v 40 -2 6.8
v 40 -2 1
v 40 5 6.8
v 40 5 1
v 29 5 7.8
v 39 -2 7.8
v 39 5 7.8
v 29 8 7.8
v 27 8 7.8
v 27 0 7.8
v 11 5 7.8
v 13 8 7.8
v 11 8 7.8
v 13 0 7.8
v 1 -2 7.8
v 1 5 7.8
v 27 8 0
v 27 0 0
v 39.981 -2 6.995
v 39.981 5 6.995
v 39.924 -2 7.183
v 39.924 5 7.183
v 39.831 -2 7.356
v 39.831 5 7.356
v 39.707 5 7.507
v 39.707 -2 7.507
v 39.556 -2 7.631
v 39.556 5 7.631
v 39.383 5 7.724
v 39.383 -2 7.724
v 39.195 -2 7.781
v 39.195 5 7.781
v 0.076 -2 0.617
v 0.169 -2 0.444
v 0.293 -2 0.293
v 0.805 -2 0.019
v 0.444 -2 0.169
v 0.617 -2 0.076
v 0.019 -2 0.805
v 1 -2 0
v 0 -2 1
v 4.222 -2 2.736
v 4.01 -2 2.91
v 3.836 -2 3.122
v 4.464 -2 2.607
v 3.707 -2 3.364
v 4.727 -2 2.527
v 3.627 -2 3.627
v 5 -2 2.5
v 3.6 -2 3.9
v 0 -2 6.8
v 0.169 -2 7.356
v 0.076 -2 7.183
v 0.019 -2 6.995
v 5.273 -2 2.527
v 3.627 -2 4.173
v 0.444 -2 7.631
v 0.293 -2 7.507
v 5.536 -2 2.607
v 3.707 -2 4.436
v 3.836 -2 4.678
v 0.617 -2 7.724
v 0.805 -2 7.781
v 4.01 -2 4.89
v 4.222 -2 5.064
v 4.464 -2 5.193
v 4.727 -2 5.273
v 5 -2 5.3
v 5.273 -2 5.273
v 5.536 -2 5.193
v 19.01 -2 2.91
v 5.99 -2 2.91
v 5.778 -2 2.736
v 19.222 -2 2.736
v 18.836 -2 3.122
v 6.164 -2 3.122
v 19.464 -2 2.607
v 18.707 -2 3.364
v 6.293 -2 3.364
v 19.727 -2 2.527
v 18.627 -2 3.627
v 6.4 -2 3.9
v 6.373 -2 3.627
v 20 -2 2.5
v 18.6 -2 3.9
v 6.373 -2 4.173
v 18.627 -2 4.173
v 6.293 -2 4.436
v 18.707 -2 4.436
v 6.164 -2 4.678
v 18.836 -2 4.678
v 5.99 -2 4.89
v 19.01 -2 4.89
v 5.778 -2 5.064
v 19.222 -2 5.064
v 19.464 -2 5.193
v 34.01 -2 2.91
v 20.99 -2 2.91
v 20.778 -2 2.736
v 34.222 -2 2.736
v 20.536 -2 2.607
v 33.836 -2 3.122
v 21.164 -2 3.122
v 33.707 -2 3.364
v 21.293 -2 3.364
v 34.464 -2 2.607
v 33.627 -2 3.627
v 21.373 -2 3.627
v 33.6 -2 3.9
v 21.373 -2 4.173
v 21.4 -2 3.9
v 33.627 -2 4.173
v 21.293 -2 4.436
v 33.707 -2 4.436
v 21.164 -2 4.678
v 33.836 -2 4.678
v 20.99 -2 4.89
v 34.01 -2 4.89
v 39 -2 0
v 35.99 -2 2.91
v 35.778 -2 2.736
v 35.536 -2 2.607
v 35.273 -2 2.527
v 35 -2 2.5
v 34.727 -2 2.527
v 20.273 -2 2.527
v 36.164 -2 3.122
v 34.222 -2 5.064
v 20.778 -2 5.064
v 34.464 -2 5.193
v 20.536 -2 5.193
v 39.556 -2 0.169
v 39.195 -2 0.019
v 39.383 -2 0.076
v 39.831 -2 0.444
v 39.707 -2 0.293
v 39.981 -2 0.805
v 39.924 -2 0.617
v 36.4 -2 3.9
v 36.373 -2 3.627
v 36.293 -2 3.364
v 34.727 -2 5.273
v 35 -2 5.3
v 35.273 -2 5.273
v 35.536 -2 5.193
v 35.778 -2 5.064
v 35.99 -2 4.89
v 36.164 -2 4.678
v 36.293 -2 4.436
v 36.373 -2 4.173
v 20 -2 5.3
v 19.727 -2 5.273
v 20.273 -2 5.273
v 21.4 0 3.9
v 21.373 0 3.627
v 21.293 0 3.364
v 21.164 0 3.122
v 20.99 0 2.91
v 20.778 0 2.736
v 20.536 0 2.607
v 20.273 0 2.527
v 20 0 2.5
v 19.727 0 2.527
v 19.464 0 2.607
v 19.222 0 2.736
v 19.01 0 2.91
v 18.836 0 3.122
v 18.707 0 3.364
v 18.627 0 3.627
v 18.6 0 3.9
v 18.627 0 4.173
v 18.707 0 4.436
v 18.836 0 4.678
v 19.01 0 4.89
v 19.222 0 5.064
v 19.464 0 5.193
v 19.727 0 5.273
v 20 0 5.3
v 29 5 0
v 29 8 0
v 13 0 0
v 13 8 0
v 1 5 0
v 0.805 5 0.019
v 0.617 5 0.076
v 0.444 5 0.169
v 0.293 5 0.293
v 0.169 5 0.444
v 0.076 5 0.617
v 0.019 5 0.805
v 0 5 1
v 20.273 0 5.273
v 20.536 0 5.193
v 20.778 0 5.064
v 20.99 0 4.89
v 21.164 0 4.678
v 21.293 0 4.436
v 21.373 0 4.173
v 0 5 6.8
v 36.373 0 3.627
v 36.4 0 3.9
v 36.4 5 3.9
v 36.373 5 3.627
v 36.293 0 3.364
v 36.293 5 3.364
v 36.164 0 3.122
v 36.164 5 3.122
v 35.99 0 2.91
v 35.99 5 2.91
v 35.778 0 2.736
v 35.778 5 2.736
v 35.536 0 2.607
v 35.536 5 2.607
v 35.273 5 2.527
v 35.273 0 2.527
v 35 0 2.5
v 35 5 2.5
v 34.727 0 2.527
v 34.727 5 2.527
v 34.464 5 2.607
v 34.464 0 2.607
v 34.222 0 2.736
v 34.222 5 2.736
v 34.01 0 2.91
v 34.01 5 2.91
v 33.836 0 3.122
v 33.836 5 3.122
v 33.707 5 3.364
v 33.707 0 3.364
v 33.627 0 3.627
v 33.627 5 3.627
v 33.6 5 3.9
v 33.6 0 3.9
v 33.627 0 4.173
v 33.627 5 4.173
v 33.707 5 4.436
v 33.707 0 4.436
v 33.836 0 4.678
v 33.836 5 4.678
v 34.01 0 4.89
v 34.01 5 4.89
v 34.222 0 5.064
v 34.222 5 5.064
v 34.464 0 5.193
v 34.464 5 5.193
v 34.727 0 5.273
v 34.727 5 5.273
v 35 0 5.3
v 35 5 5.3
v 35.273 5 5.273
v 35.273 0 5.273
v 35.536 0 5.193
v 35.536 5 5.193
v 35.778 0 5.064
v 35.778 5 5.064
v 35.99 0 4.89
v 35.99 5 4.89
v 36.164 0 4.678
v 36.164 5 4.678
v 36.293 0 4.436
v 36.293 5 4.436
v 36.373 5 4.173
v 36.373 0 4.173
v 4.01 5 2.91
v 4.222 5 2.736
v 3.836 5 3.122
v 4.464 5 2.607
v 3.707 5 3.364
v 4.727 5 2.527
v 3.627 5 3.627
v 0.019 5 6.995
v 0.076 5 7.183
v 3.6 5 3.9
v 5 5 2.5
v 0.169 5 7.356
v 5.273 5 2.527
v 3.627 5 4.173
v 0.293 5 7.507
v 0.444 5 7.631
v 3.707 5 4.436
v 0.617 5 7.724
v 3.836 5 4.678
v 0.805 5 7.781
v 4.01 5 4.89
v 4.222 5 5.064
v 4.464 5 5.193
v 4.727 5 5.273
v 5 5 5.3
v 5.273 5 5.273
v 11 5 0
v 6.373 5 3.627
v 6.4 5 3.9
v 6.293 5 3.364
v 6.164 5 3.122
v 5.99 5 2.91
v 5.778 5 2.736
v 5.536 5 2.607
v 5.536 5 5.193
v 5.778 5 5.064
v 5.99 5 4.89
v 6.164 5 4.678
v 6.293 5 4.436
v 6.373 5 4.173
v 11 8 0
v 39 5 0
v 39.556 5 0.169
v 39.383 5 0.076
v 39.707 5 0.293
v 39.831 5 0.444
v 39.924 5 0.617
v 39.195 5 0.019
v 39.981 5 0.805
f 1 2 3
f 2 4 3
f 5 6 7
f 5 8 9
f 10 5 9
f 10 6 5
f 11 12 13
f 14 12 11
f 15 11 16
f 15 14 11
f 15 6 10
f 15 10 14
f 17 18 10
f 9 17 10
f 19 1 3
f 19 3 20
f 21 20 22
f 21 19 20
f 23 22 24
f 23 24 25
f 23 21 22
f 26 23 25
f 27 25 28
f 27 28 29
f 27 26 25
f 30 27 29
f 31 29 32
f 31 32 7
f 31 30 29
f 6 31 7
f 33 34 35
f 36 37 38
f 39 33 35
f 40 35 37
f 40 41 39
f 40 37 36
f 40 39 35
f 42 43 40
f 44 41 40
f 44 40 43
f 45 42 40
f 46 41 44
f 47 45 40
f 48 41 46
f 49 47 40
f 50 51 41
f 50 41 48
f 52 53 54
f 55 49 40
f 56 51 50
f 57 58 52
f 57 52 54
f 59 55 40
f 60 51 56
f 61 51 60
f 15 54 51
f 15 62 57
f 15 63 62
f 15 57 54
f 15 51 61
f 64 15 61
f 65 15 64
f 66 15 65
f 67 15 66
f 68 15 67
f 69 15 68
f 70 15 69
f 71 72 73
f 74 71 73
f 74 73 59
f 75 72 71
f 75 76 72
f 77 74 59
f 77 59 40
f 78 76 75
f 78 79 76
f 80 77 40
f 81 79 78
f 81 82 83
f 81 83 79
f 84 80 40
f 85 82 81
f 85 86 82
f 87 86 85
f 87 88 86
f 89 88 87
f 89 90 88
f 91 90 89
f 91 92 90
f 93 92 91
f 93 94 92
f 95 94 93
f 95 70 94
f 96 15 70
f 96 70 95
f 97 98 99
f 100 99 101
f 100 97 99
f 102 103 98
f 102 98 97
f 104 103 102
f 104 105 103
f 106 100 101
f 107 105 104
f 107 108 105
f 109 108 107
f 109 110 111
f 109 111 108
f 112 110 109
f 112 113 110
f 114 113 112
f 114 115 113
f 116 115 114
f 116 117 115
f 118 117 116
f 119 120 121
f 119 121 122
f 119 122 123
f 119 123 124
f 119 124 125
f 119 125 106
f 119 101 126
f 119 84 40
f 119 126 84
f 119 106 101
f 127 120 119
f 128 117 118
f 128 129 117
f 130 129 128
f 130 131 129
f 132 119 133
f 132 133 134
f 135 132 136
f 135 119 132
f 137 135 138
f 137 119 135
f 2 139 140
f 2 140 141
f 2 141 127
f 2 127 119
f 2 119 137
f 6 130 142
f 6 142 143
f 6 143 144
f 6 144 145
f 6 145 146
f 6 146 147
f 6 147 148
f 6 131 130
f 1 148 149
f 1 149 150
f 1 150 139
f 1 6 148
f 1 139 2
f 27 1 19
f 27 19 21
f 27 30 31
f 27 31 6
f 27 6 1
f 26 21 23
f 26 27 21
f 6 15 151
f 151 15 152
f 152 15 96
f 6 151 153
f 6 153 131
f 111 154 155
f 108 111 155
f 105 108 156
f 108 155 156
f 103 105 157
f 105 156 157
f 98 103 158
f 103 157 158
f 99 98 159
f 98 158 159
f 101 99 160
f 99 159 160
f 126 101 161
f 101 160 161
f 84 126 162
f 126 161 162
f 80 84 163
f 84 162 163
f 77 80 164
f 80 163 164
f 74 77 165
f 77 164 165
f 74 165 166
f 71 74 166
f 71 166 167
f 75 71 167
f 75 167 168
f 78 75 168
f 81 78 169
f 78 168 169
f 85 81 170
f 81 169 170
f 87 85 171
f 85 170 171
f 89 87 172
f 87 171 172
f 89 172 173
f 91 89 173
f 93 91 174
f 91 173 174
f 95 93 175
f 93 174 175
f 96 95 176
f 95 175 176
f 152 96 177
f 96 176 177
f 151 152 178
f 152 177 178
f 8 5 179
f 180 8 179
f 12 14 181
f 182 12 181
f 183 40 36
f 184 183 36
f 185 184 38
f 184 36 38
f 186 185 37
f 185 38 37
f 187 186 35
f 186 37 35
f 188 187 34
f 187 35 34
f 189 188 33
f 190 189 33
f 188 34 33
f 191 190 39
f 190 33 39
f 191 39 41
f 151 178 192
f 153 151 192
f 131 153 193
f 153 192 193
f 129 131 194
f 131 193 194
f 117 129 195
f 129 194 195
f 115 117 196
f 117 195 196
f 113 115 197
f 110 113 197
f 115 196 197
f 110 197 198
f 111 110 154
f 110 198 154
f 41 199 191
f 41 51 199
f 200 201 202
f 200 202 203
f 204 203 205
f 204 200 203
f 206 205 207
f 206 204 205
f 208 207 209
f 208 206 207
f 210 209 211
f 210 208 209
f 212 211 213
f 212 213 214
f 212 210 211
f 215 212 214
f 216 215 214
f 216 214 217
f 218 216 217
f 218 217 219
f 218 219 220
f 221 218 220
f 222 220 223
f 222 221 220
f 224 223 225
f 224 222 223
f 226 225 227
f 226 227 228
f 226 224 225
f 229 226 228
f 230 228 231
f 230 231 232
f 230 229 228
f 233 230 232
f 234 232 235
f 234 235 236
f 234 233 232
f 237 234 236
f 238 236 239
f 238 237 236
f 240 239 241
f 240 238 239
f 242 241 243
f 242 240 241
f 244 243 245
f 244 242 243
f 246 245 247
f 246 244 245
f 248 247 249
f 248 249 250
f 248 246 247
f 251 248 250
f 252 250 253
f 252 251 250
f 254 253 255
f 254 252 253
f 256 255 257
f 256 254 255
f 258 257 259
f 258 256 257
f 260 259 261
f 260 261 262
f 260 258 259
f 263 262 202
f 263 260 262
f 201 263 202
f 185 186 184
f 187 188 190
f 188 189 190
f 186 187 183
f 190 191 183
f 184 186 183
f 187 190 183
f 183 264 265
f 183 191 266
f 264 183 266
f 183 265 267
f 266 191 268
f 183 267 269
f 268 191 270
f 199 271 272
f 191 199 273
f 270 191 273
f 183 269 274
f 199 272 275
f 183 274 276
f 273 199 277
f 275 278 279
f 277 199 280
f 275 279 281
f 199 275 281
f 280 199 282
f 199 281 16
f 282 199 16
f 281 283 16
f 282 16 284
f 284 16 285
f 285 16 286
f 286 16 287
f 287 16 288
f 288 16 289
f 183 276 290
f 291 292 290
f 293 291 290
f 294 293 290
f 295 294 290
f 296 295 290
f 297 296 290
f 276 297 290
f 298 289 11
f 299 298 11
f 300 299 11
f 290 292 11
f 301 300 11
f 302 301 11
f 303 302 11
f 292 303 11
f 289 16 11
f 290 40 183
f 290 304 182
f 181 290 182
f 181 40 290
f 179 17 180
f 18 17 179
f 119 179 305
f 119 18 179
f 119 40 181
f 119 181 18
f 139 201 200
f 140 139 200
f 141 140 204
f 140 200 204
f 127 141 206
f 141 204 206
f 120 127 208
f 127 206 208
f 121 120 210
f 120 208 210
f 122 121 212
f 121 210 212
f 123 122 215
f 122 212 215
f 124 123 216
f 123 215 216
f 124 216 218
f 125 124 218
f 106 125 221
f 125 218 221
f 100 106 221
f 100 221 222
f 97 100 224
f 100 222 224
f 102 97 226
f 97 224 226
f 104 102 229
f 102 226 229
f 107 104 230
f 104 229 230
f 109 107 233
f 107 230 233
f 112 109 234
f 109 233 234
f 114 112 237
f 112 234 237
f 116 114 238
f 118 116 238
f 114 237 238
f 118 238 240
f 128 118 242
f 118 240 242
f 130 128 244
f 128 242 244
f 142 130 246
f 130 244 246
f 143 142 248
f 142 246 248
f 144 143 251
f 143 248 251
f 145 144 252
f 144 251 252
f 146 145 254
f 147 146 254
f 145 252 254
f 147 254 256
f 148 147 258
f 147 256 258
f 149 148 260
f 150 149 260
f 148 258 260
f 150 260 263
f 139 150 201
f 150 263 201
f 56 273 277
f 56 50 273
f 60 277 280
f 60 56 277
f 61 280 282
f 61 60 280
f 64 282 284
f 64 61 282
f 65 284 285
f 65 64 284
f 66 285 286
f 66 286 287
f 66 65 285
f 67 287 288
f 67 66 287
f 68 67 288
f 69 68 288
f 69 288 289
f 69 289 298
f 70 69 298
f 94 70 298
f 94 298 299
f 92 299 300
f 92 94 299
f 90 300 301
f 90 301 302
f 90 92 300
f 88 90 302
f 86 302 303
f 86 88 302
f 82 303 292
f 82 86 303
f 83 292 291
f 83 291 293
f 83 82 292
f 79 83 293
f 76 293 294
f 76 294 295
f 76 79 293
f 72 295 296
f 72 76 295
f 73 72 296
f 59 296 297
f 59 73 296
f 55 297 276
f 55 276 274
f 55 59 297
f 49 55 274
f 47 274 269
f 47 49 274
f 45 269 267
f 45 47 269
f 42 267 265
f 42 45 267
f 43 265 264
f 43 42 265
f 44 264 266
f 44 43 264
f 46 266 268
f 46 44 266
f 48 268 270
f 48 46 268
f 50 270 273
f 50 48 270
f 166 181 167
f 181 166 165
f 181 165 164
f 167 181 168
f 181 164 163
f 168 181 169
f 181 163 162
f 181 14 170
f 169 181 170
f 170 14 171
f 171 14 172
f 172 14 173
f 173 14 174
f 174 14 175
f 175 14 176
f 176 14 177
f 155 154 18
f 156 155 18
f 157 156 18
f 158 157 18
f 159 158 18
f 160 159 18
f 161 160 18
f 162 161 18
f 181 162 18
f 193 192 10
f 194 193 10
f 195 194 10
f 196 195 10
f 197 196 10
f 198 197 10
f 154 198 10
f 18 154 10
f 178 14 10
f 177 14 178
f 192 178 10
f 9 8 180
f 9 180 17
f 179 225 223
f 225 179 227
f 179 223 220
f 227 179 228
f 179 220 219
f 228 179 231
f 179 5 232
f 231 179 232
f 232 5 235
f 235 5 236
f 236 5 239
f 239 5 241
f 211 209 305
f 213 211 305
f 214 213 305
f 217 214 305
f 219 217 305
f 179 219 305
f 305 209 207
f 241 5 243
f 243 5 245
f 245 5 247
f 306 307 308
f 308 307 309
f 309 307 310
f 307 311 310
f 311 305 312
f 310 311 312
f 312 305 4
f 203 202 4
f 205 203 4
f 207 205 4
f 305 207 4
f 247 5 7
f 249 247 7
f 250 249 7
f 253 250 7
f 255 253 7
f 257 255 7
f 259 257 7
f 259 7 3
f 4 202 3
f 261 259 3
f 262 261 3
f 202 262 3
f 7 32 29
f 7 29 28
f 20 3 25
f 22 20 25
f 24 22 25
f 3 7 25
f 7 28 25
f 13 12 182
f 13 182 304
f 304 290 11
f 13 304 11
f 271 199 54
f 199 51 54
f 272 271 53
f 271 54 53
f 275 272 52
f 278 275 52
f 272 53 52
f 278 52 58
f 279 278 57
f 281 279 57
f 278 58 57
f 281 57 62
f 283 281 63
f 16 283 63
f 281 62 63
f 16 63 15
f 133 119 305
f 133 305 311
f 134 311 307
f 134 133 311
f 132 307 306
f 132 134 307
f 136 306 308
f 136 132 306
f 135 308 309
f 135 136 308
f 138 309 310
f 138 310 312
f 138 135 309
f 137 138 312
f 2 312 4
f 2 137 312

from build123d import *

# Parameters (mm, degrees)
F1_DEPTH = 2
F2_R     = 1
F4_DEPTH = 8
F5_DEPTH = 5


with BuildPart() as f1:
    # F0 (on Front) → F1 (new body)
    with BuildSketch(Plane.XZ):
        Polygon((0, 3.9), (0, 0), (40, 0), (40, 3.9), (40, 7.8), (20, 7.8), (0, 7.8), align=None)
        with BuildLine():
            ThreePointArc((6.4, 3.9), (5, 2.5), (3.6, 3.9))
            ThreePointArc((3.6, 3.9), (5, 5.3), (6.4, 3.9))
        make_face(mode=Mode.SUBTRACT)
        with BuildLine():
            ThreePointArc((21.4, 3.9), (19.0100505063, 2.9100505063), (20, 5.3))
            ThreePointArc((20, 5.3), (20.9899494937, 4.8899494937), (21.4, 3.9))
        make_face(mode=Mode.SUBTRACT)
        with BuildLine():
            ThreePointArc((33.6, 3.9), (35, 5.3), (36.4, 3.9))
            ThreePointArc((36.4, 3.9), (35, 2.5), (33.6, 3.9))
        make_face(mode=Mode.SUBTRACT)
    extrude(amount=F1_DEPTH)

    # F2
    f2_edges = [f1.edges().sort_by_distance(p)[0] for p in [
        (0, -1, 7.8),
        (0, -1, 0),
        (40, -1, 7.8),
        (40, -1, 0),
    ]]
    fillet(f2_edges, radius=F2_R)

    # F3 (on face) → F4 (join)
    with BuildSketch(Plane(origin=(0, 0, 0), x_dir=(-1, 0, 0), z_dir=(0, 1, 0))):
        Polygon((-13, 7.8), (-13, 3.9), (-13, 0), (-11, 0), (-11, 7.8), align=None)
        Polygon((-27, 0), (-27, 3.9), (-27, 7.8), (-29, 7.8), (-29, 0), align=None)
    extrude(amount=F4_DEPTH)

    # F5 (add): faces of the model
    f5_faces = [f1.faces().sort_by_distance(p)[0] for p in [
        (0.3882451983, 0, 0.3882451983),
        (29.1348480626, 0, 3.9),
    ]]
    extrude(f5_faces, amount=F5_DEPTH)


solid = f1.part
